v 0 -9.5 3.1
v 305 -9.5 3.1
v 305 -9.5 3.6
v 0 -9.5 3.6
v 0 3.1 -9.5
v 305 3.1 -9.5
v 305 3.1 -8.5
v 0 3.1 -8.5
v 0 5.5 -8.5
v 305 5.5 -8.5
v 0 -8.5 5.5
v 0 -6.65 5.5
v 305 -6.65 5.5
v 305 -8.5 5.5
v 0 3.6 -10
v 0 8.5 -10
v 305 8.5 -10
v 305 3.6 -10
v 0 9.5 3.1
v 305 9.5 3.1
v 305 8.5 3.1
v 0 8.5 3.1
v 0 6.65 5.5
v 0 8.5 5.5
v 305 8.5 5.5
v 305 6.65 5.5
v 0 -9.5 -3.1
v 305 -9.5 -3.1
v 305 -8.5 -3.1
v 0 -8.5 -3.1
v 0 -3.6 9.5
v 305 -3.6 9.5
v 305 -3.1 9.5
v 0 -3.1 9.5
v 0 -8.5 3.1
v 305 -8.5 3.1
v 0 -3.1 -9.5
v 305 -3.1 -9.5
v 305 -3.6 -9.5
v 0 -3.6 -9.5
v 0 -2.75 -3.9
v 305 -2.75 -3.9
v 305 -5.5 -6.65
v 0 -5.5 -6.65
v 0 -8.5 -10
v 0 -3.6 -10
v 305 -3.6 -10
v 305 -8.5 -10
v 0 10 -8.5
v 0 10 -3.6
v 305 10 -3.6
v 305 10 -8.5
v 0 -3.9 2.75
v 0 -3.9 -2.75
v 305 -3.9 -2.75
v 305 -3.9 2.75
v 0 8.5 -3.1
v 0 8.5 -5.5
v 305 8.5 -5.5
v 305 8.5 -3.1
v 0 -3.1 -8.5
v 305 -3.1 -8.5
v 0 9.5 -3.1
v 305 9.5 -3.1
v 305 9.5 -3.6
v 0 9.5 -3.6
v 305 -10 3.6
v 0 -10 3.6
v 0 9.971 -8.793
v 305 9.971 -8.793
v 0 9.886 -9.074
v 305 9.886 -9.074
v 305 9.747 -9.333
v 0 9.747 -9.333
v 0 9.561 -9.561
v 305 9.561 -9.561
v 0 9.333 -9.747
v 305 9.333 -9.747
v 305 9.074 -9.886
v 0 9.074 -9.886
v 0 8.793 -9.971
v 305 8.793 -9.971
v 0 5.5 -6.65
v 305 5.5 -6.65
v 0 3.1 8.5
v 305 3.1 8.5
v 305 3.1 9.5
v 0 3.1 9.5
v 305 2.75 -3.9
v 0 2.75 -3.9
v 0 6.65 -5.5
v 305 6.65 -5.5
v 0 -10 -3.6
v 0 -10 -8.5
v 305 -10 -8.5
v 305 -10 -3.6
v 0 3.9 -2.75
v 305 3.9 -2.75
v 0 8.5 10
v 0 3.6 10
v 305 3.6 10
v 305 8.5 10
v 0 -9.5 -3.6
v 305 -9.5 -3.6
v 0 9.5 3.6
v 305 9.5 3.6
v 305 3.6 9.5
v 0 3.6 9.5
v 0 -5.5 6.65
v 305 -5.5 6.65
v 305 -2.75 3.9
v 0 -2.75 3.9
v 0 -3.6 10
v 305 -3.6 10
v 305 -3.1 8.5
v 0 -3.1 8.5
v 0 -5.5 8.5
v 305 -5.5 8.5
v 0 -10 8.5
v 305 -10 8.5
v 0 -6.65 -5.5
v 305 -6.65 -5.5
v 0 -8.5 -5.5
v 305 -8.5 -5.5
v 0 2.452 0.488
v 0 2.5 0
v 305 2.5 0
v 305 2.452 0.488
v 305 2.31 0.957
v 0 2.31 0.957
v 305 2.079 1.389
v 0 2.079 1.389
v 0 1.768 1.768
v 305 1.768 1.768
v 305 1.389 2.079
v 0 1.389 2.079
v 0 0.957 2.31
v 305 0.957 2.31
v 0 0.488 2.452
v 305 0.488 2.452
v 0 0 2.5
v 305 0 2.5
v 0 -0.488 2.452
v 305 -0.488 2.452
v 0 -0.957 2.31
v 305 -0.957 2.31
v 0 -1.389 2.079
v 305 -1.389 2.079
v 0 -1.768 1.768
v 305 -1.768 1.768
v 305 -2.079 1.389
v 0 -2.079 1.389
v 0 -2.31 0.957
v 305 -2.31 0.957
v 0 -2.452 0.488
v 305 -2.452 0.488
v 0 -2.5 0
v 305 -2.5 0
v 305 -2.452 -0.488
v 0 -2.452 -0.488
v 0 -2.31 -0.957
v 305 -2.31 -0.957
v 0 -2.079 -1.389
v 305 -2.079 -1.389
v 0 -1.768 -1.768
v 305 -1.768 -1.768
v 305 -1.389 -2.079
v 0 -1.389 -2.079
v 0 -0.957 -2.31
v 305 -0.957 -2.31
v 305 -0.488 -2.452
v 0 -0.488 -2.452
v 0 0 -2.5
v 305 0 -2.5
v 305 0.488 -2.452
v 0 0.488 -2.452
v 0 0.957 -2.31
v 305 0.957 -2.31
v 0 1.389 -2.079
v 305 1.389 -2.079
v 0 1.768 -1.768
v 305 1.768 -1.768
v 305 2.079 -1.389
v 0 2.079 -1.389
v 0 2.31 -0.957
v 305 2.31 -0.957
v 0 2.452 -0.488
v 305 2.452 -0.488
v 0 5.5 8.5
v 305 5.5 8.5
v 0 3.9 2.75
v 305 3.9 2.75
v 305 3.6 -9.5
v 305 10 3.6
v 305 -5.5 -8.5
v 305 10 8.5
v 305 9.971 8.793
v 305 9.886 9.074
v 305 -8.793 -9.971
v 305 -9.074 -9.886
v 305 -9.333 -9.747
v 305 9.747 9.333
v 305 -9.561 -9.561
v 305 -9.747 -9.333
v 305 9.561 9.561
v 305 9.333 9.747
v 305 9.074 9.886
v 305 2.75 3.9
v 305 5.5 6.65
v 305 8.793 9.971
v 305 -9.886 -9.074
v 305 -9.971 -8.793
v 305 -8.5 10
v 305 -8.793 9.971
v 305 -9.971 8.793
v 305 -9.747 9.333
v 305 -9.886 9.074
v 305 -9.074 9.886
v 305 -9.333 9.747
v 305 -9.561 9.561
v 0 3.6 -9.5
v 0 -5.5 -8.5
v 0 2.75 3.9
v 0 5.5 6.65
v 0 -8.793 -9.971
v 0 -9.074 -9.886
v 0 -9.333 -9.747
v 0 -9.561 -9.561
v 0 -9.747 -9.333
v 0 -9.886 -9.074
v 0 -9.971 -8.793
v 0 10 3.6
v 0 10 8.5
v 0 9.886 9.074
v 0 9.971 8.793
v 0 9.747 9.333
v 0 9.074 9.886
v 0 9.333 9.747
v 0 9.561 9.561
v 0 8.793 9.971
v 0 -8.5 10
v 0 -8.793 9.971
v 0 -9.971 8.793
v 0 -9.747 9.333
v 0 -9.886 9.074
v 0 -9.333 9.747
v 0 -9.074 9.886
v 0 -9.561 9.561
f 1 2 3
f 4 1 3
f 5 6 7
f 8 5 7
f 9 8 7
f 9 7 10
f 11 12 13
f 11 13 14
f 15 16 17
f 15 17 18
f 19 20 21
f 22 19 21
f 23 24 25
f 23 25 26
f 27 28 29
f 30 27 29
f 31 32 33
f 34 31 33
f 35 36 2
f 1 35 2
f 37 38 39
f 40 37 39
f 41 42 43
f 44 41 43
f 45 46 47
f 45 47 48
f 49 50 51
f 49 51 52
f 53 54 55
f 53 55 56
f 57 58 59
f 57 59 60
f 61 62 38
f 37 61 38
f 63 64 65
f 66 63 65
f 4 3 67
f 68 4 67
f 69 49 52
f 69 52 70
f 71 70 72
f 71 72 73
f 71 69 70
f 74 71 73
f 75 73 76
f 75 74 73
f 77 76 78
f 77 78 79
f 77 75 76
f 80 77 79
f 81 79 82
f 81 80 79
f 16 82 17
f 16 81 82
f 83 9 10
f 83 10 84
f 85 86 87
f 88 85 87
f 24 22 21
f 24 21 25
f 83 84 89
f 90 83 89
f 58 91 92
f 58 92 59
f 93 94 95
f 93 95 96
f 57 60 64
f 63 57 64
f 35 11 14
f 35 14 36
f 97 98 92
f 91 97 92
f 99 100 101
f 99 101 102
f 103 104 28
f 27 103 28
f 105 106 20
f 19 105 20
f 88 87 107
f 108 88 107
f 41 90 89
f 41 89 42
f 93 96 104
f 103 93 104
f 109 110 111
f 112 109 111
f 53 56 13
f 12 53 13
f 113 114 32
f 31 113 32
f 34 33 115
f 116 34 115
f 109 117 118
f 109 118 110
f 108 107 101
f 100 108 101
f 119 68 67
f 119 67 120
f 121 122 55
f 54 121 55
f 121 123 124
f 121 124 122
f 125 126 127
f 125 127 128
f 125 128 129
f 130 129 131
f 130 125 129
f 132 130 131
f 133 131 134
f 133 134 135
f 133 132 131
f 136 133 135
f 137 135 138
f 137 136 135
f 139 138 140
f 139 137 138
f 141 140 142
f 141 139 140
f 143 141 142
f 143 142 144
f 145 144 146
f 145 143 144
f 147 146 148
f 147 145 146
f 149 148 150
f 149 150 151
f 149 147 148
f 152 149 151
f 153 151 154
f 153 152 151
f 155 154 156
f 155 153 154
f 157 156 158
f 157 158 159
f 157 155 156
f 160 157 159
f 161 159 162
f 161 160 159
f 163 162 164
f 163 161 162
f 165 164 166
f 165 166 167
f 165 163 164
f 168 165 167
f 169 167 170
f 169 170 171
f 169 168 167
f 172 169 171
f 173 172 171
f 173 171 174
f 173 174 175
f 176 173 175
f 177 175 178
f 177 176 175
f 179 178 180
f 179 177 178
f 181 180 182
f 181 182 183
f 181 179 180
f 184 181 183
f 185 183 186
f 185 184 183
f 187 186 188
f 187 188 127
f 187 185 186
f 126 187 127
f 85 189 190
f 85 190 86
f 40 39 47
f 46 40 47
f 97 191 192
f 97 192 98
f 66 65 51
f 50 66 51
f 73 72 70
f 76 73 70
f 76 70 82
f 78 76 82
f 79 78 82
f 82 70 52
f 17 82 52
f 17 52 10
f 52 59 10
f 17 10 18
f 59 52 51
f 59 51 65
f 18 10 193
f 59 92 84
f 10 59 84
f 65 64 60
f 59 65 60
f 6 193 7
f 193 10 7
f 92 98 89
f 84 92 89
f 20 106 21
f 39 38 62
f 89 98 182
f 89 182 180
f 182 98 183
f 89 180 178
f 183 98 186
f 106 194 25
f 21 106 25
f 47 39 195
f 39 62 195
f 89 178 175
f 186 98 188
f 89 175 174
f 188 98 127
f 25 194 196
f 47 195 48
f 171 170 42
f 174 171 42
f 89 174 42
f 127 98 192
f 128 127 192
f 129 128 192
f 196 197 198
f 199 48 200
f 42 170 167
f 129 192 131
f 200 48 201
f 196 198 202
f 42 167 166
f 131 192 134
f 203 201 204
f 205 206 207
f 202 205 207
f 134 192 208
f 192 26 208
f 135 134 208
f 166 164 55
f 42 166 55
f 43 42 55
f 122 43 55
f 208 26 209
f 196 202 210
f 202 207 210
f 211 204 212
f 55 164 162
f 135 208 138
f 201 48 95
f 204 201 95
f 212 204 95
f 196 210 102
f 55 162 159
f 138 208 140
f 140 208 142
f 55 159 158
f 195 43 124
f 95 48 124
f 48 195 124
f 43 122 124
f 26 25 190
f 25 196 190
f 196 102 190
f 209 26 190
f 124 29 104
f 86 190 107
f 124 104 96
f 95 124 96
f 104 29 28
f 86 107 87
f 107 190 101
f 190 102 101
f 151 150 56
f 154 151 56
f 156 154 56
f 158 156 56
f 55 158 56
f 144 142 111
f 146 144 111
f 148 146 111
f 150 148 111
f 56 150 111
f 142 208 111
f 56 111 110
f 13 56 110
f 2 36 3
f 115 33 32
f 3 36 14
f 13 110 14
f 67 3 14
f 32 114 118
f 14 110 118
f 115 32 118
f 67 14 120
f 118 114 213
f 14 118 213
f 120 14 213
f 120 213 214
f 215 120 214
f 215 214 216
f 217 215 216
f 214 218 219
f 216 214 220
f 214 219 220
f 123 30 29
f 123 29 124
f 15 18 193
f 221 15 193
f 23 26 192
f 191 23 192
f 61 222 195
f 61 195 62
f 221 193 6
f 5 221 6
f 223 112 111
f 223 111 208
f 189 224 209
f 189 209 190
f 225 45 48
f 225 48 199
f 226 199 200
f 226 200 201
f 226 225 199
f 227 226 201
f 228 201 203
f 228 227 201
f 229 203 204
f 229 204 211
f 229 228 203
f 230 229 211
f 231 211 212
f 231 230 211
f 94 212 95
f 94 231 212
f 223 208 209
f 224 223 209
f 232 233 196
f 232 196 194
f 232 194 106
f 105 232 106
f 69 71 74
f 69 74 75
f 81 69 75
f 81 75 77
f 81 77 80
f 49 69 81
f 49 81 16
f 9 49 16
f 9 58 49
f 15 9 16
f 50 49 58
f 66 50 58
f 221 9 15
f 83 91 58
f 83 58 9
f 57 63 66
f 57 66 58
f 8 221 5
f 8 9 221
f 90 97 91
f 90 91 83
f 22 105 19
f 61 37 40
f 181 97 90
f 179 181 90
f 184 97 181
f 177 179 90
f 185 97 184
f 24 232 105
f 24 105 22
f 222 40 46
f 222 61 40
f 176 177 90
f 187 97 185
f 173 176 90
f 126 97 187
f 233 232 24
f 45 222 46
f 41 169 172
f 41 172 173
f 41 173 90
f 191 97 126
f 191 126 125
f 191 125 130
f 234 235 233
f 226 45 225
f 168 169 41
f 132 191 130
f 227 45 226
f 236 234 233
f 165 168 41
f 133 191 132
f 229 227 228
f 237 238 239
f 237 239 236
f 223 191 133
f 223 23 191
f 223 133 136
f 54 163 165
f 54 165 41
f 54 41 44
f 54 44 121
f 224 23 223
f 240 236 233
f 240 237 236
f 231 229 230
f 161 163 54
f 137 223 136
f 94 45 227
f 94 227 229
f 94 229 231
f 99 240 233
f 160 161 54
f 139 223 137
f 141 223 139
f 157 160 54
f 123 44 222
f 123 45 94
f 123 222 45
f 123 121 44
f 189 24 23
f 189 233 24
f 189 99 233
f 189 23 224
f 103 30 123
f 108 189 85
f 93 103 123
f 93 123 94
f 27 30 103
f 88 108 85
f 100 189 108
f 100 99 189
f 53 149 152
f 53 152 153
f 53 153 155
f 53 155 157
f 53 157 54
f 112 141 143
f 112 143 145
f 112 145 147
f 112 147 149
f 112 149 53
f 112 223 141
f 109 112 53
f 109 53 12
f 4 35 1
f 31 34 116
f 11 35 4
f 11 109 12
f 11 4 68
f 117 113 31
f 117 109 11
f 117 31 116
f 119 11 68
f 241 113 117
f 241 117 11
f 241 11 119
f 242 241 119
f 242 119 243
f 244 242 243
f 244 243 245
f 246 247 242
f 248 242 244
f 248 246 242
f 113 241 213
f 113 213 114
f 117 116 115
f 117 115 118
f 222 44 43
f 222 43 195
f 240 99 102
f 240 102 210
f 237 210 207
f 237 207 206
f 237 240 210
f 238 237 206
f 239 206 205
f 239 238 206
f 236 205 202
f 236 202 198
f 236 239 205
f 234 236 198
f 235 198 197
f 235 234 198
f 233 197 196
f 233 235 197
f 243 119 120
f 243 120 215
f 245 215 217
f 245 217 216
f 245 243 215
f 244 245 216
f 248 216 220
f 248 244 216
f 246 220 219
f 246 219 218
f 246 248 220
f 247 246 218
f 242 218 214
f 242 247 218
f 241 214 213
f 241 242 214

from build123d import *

# Parameters (mm, degrees)
SKETCH1_R                = 2.5
F_20_X_20_X_R1_5_1_DEPTH = 305


with BuildPart() as part:
    # Sketch1 → 铝型材 20 X 20 X R1.5(1) (new body)
    with BuildSketch(Plane.YZ):
        with BuildLine():
            Line((-3.6, 10), (-3.6, 9.5))
            Line((-3.6, 9.5), (-3.1, 9.5))
            Line((-3.1, 9.5), (-3.1, 8.5))
            Line((-3.1, 8.5), (-5.5, 8.5))
            Line((-5.5, 8.5), (-5.5, 6.65))
            Line((-5.5, 6.65), (-2.75, 3.9))
            Line((-2.75, 3.9), (2.75, 3.9))
            Line((2.75, 3.9), (5.5, 6.65))
            Line((5.5, 6.65), (5.5, 8.5))
            Line((5.5, 8.5), (3.1, 8.5))
            Line((3.1, 8.5), (3.1, 9.5))
            Line((3.1, 9.5), (3.6, 9.5))
            Line((3.6, 9.5), (3.6, 10))
            Line((3.6, 10), (8.5, 10))
            ThreePointArc((8.5, 10), (9.560660172, 9.560660172), (10, 8.5))
            Line((10, 8.5), (10, 3.6))
            Line((10, 3.6), (9.5, 3.6))
            Line((9.5, 3.6), (9.5, 3.1))
            Line((9.5, 3.1), (8.5, 3.1))
            Line((8.5, 3.1), (8.5, 5.5))
            Line((8.5, 5.5), (6.65, 5.5))
            Line((6.65, 5.5), (3.9, 2.75))
            Line((3.9, 2.75), (3.9, -2.75))
            Line((3.9, -2.75), (6.65, -5.5))
            Line((6.65, -5.5), (8.5, -5.5))
            Line((8.5, -5.5), (8.5, -3.1))
            Line((8.5, -3.1), (9.5, -3.1))
            Line((9.5, -3.1), (9.5, -3.6))
            Line((9.5, -3.6), (10, -3.6))
            Line((10, -3.6), (10, -8.5))
            ThreePointArc((10, -8.5), (9.560660172, -9.560660172), (8.5, -10))
            Line((8.5, -10), (3.6, -10))
            Line((3.6, -10), (3.6, -9.5))
            Line((3.6, -9.5), (3.1, -9.5))
            Line((3.1, -9.5), (3.1, -8.5))
            Line((3.1, -8.5), (5.5, -8.5))
            Line((5.5, -8.5), (5.5, -6.65))
            Line((5.5, -6.65), (2.75, -3.9))
            Line((2.75, -3.9), (-2.75, -3.9))
            Line((-2.75, -3.9), (-5.5, -6.65))
            Line((-5.5, -6.65), (-5.5, -8.5))
            Line((-5.5, -8.5), (-3.1, -8.5))
            Line((-3.1, -8.5), (-3.1, -9.5))
            Line((-3.1, -9.5), (-3.6, -9.5))
            Line((-3.6, -9.5), (-3.6, -10))
            Line((-3.6, -10), (-8.5, -10))
            ThreePointArc((-8.5, -10), (-9.560660172, -9.560660172), (-10, -8.5))
            Line((-10, -8.5), (-10, -3.6))
            Line((-10, -3.6), (-9.5, -3.6))
            Line((-9.5, -3.6), (-9.5, -3.1))
            Line((-9.5, -3.1), (-8.5, -3.1))
            Line((-8.5, -3.1), (-8.5, -5.5))
            Line((-8.5, -5.5), (-6.65, -5.5))
            Line((-6.65, -5.5), (-3.9, -2.75))
            Line((-3.9, -2.75), (-3.9, 2.75))
            Line((-3.9, 2.75), (-6.65, 5.5))
            Line((-6.65, 5.5), (-8.5, 5.5))
            Line((-8.5, 5.5), (-8.5, 3.1))
            Line((-8.5, 3.1), (-9.5, 3.1))
            Line((-9.5, 3.1), (-9.5, 3.6))
            Line((-9.5, 3.6), (-10, 3.6))
            Line((-10, 3.6), (-10, 8.5))
            ThreePointArc((-10, 8.5), (-9.560660172, 9.560660172), (-8.5, 10))
            Line((-8.5, 10), (-3.6, 10))
        make_face()
        Circle(SKETCH1_R, mode=Mode.SUBTRACT)
    extrude(amount=F_20_X_20_X_R1_5_1_DEPTH)


solid = part.part
